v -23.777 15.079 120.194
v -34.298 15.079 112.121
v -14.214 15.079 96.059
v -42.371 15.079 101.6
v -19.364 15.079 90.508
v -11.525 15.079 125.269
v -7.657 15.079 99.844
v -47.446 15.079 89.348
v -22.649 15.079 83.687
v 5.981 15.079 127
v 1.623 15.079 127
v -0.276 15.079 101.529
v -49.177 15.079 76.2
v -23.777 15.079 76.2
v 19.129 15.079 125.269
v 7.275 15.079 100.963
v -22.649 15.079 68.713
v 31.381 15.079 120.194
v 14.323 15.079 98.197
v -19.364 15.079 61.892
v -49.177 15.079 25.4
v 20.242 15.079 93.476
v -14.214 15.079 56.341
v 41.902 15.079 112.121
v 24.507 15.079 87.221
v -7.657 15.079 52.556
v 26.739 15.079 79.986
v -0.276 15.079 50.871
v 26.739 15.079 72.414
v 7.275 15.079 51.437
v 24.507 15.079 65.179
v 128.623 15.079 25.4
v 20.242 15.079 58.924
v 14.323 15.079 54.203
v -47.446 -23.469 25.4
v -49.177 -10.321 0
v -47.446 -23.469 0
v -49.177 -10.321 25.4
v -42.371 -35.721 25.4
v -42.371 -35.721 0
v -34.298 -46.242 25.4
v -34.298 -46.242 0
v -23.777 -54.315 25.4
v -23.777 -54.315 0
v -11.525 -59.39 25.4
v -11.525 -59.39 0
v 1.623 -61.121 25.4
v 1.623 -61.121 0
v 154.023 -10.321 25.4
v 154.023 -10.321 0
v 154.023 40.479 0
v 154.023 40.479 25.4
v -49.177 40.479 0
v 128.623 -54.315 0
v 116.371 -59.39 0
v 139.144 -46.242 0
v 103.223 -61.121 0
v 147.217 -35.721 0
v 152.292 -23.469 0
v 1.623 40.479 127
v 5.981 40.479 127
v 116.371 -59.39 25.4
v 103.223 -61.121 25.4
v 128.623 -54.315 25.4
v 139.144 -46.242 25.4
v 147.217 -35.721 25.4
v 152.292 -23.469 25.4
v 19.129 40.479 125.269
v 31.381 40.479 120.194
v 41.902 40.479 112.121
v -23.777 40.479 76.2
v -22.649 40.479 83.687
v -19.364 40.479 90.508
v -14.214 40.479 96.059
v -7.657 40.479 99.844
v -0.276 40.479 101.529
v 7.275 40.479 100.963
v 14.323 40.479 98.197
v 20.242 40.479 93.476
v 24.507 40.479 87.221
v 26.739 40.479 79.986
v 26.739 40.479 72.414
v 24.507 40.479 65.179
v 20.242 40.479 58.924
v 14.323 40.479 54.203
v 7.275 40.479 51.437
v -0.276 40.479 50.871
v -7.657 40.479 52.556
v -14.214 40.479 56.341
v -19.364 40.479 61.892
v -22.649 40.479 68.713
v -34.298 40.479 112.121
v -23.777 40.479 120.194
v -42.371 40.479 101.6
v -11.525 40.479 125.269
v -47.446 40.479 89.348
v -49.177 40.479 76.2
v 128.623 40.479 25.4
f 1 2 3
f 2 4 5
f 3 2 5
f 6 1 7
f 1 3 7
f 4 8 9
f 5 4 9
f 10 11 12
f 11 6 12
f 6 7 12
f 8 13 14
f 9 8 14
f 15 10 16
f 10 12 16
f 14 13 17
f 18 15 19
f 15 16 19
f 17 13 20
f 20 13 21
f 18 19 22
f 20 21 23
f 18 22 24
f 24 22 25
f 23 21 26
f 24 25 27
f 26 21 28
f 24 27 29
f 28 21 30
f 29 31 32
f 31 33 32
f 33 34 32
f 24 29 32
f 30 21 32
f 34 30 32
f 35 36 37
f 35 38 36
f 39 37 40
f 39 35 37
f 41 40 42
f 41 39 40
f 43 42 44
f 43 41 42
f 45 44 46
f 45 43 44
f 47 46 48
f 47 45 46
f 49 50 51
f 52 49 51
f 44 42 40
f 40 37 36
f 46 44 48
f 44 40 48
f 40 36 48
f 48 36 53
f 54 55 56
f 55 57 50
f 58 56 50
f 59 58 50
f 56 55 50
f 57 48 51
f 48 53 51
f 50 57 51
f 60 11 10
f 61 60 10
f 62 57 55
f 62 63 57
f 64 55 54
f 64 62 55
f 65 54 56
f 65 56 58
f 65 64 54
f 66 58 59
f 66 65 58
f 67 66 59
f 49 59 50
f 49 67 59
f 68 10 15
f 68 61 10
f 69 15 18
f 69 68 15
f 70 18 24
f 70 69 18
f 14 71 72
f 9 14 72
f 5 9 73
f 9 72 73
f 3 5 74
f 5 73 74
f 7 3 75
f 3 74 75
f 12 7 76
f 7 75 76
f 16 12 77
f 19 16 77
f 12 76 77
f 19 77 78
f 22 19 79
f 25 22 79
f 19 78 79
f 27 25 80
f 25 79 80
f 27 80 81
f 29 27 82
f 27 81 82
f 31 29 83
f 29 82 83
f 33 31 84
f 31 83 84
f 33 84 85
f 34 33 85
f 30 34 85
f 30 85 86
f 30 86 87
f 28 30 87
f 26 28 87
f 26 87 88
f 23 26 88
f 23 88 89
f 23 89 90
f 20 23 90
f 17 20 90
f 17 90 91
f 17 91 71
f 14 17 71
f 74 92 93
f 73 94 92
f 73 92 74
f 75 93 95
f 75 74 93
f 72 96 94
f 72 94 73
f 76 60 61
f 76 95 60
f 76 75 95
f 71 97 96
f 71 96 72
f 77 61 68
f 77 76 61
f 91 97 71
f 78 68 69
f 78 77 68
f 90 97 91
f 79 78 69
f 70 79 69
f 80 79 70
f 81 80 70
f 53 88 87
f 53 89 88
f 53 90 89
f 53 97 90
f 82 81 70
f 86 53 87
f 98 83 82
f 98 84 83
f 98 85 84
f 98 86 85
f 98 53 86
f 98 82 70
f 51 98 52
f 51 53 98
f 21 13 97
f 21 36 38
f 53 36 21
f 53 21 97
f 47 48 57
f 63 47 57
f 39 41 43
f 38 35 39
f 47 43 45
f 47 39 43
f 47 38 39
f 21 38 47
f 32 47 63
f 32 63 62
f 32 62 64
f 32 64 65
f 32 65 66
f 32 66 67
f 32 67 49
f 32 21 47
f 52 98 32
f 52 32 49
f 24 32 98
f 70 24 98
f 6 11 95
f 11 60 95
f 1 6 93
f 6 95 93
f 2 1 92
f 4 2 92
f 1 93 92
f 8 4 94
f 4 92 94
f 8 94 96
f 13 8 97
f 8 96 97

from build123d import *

# Parameters (mm, degrees)
F0_W     = 203.2
F0_H     = 101.6
F1_DEPTH = 25.4
F2_R     = 50.8
F3_W     = 177.8
F3_H     = 25.4
F4_DEPTH = 25.4
F5_DEPTH = 101.6
F6_SIZE2 = 101.59999
F6_SIZE  = 101.59999
F7_R     = 50.8
F9_D     = 50.8


# Not quite as in the source:
# - a fillet or chamfer is up to 0.001 mm smaller than in the source, because OpenCascade refuses the exact size


with BuildPart() as f1:
    # F0 (on Top) → F1 (new body)
    with BuildSketch(Plane.XY):
        with Locations((52.4225905538, -10.3211964953)):
            Rectangle(F0_W, F0_H)
    extrude(amount=F1_DEPTH)

    # F2
    f2_edges = [f1.edges().sort_by_distance(p)[0] for p in [
        (-49.177409, -61.121196, 12.7),
        (154.022591, -61.121196, 12.7),
    ]]
    fillet(f2_edges, radius=F2_R)

    # F3 (on face) → F4 (join)
    with BuildSketch(Plane.XY.offset(25.4)):
        with Locations((39.7225905538, 27.7788035047)):
            Rectangle(F3_W, F3_H)
    extrude(amount=F4_DEPTH)

    # F3 (on face) → F5 (join)
    with BuildSketch(Plane.XY.offset(25.4)):
        with Locations((39.7225905538, 27.7788035047)):
            Rectangle(F3_W, F3_H)
    extrude(amount=F5_DEPTH)

    # F6 (size 101.6 and 101.6 in the source; OpenCascade refuses exactly that, so slightly less here)
    f6_edges = [f1.edges().sort_by_distance(p)[0] for p in [
        (128.622591, 27.778804, 127),
    ]]
    chamfer(f6_edges, length=F6_SIZE, length2=F6_SIZE2)

    # F7
    f7_edges = [f1.edges().sort_by_distance(p)[0] for p in [
        (-49.177409, 27.778804, 127),
        (27.022601, 27.778804, 127),
    ]]
    fillet(f7_edges, radius=F7_R)

    # F9 (through all)
    with Locations(Plane.XZ.offset(-15.0788035047)):
        with Locations((1.6225905538, 76.2)):
            Hole(F9_D / 2)


solid = f1.part
